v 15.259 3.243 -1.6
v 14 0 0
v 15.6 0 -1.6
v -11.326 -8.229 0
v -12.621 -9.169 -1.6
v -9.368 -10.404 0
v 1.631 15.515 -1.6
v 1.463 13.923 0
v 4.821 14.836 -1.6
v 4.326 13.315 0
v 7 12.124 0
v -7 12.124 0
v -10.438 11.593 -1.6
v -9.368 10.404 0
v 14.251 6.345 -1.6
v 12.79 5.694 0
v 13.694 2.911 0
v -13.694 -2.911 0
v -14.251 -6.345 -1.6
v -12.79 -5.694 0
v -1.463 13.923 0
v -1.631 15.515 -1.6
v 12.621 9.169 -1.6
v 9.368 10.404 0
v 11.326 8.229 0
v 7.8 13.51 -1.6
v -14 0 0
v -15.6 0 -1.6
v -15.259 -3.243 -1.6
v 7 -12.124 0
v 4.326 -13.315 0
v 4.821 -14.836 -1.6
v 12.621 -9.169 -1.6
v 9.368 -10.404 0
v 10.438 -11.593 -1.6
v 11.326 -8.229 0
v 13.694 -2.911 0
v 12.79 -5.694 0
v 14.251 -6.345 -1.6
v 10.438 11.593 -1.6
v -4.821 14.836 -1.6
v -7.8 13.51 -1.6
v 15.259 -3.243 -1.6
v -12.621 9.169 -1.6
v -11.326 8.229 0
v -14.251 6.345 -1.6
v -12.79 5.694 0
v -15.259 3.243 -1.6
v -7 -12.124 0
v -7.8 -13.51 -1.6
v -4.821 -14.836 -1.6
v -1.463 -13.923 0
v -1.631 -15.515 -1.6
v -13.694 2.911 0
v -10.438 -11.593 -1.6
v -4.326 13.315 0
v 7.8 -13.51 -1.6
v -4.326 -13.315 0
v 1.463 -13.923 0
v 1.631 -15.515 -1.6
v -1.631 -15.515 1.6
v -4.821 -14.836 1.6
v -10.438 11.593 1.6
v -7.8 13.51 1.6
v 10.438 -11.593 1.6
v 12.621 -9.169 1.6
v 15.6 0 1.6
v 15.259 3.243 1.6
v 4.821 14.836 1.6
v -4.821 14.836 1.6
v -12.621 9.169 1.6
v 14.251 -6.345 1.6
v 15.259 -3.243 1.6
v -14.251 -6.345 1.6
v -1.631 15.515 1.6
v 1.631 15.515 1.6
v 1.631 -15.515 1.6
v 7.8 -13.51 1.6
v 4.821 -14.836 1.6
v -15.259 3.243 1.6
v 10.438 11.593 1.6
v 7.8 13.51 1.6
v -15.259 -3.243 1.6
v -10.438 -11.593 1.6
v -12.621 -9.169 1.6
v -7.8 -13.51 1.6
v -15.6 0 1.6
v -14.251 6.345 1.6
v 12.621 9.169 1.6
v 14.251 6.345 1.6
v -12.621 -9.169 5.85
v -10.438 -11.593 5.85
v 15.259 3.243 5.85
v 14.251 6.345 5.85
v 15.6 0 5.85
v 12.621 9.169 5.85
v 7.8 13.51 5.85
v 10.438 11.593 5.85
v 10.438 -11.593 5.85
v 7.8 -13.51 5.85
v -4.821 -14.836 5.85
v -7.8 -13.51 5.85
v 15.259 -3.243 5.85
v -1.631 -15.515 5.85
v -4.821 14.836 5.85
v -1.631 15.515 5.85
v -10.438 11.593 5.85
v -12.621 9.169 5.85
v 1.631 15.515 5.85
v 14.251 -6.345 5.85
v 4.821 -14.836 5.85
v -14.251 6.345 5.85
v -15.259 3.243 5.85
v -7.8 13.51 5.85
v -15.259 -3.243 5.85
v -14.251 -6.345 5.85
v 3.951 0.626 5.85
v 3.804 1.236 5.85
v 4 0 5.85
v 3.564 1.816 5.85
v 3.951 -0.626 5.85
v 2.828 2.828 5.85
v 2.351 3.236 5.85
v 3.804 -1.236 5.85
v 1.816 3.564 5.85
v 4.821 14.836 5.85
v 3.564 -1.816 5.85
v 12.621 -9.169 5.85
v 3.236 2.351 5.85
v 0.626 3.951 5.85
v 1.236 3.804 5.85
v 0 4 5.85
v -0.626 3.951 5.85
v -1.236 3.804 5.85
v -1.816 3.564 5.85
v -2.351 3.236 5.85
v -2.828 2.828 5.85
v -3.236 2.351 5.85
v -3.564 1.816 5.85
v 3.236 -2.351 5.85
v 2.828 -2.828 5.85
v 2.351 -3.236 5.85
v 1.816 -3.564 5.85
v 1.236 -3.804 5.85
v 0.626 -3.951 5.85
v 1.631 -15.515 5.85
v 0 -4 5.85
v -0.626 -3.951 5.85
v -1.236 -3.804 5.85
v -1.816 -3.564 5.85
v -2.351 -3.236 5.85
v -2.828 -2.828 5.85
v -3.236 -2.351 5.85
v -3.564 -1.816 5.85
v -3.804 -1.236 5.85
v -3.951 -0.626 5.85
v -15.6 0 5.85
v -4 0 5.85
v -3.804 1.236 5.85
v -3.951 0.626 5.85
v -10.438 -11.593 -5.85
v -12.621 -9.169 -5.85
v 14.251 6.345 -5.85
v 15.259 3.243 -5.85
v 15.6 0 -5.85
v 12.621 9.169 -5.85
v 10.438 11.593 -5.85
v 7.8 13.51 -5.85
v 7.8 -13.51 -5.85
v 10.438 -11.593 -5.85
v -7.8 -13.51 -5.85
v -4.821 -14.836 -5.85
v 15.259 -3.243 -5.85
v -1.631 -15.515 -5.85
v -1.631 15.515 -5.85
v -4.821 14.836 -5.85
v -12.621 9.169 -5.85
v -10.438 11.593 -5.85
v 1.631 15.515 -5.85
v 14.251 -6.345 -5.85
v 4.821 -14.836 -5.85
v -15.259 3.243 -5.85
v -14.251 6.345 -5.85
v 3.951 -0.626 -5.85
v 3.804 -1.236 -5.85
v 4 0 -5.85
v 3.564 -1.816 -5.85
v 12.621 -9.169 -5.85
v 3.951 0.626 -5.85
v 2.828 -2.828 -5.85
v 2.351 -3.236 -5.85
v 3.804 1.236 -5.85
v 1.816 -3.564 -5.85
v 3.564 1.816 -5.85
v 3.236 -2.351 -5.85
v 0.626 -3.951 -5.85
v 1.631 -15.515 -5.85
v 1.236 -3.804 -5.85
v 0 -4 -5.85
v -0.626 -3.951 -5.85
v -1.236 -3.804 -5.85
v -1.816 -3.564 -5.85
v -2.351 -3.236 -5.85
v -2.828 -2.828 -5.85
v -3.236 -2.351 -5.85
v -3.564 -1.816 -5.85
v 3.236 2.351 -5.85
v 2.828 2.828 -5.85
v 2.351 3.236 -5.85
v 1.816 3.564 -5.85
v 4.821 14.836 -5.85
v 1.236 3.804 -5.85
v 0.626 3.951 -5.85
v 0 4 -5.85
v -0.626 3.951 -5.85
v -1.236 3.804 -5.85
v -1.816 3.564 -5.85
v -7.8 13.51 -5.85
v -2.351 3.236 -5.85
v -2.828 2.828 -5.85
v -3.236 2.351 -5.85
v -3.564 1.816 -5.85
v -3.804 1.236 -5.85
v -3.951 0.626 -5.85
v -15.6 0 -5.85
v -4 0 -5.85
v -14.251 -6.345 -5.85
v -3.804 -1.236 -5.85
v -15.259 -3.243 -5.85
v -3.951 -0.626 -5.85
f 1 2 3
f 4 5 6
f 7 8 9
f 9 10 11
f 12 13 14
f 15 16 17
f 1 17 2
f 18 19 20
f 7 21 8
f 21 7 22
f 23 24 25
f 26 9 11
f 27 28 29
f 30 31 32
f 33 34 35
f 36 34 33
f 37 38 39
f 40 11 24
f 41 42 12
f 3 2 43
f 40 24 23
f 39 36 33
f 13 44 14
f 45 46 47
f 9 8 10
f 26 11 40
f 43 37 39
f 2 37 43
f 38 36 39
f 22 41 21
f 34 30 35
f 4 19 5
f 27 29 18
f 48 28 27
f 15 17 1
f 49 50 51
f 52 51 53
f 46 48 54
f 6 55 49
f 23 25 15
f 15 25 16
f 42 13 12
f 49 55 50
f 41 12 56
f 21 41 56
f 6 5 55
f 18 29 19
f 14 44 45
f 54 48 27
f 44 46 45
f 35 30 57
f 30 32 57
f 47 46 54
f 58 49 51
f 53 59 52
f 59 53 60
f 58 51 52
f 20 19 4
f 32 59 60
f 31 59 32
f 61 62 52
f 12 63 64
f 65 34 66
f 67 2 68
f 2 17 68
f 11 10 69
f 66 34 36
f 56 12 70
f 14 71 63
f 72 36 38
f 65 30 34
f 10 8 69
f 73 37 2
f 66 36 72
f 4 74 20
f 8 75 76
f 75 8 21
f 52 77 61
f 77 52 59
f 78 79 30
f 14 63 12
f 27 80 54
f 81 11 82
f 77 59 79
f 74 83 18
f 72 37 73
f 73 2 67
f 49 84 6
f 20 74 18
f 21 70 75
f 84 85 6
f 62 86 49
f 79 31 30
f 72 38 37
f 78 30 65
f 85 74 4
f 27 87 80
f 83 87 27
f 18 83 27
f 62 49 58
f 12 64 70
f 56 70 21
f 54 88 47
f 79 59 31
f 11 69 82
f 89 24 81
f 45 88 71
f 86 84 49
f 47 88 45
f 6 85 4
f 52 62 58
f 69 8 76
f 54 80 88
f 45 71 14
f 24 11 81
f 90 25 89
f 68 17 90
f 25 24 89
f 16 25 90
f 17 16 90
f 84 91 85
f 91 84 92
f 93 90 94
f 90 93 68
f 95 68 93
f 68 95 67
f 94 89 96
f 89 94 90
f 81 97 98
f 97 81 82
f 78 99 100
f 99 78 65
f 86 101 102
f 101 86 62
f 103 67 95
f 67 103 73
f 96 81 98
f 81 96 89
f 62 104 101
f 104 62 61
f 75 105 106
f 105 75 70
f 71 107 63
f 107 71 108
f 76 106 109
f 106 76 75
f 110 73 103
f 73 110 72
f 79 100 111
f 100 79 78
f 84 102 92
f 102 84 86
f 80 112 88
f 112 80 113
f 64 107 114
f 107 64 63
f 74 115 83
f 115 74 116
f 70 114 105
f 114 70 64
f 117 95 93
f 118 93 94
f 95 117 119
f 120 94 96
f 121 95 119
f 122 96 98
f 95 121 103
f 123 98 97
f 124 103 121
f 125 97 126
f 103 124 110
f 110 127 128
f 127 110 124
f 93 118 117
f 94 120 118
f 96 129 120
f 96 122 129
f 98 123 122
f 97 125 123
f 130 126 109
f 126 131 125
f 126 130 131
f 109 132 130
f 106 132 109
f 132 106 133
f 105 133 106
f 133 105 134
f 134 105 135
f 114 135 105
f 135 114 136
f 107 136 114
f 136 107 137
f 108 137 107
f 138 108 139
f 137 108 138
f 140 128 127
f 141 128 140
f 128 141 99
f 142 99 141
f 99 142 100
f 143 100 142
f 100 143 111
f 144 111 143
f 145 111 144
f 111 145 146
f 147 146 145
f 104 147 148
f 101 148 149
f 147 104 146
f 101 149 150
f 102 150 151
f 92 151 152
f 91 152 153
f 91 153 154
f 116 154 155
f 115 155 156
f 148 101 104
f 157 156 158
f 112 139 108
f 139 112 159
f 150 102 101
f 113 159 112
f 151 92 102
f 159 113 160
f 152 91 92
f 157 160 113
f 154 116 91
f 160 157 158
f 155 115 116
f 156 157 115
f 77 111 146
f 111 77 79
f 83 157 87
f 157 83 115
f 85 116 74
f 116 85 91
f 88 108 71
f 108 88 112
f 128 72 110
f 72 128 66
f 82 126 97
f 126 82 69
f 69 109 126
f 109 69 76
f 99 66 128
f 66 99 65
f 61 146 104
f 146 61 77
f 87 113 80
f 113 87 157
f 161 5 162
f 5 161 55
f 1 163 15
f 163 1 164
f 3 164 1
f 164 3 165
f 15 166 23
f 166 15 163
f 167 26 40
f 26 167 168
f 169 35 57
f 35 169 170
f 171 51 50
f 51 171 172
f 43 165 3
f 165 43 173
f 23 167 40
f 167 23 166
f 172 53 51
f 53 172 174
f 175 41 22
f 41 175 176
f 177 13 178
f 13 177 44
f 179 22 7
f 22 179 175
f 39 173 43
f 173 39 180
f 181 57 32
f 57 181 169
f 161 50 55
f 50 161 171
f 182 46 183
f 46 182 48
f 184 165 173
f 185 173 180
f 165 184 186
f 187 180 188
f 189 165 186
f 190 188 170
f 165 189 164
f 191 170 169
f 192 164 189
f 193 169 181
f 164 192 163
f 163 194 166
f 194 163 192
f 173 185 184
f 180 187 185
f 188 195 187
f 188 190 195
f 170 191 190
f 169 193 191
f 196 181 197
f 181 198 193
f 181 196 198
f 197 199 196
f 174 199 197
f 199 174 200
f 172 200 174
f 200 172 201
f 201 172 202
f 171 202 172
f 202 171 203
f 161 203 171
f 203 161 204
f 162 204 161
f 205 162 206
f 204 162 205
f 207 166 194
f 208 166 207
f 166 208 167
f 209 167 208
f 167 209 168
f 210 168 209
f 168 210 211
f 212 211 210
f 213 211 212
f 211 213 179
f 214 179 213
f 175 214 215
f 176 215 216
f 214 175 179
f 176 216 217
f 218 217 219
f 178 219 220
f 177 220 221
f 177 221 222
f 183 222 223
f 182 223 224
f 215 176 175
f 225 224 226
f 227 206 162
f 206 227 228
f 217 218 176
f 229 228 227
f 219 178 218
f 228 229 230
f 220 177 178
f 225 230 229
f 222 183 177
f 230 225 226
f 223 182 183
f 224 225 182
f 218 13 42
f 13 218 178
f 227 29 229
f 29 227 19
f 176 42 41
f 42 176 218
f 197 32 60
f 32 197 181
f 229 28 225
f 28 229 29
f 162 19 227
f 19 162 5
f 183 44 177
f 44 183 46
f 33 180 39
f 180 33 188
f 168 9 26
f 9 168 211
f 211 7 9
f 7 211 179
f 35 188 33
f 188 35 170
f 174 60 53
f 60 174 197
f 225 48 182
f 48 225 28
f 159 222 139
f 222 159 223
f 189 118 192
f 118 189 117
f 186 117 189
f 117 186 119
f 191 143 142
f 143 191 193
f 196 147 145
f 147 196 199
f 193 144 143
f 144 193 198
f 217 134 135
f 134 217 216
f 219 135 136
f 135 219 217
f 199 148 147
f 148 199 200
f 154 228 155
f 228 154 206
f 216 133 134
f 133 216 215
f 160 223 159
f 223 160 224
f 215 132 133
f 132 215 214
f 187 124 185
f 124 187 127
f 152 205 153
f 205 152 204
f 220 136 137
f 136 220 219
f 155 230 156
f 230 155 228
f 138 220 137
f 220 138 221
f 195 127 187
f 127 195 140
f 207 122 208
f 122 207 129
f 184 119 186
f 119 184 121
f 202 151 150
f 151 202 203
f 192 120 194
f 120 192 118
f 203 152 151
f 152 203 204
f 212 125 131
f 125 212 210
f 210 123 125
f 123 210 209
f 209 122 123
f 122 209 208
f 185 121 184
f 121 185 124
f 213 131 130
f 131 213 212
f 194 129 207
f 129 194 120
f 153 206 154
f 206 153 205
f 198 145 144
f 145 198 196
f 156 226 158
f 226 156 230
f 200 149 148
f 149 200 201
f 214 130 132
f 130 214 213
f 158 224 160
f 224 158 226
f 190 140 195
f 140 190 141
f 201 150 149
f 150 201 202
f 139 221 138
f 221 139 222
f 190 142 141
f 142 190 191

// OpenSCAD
// steve grabbers W wheel
od= 31.2;
id= 28;
t= (od-id);
thick= 11.7;
t2= thick-t;

function w_wheel_dia()= od;
function w_wheel_width()= thick;

module W_wheel() {
	cylinder(r1=od/2,r2=id/2, h=t/2);
	translate([0,0,t/2]) cylinder(r2=od/2,r1=id/2, h=t/2);
	translate([0,0,t]) cylinder(r=od/2, h= t2/2);
	translate([0,0,-t2/2]) cylinder(r=od/2, h= t2/2);
}

module w_wheel() {
	difference() {
		translate([0,0,-t/2]) W_wheel();
		#translate([0,0,-(thick+4)/2]) cylinder(r=8/2, h=thick+4, $fn=40);
	}
}

w_wheel();
//W_wheel();
